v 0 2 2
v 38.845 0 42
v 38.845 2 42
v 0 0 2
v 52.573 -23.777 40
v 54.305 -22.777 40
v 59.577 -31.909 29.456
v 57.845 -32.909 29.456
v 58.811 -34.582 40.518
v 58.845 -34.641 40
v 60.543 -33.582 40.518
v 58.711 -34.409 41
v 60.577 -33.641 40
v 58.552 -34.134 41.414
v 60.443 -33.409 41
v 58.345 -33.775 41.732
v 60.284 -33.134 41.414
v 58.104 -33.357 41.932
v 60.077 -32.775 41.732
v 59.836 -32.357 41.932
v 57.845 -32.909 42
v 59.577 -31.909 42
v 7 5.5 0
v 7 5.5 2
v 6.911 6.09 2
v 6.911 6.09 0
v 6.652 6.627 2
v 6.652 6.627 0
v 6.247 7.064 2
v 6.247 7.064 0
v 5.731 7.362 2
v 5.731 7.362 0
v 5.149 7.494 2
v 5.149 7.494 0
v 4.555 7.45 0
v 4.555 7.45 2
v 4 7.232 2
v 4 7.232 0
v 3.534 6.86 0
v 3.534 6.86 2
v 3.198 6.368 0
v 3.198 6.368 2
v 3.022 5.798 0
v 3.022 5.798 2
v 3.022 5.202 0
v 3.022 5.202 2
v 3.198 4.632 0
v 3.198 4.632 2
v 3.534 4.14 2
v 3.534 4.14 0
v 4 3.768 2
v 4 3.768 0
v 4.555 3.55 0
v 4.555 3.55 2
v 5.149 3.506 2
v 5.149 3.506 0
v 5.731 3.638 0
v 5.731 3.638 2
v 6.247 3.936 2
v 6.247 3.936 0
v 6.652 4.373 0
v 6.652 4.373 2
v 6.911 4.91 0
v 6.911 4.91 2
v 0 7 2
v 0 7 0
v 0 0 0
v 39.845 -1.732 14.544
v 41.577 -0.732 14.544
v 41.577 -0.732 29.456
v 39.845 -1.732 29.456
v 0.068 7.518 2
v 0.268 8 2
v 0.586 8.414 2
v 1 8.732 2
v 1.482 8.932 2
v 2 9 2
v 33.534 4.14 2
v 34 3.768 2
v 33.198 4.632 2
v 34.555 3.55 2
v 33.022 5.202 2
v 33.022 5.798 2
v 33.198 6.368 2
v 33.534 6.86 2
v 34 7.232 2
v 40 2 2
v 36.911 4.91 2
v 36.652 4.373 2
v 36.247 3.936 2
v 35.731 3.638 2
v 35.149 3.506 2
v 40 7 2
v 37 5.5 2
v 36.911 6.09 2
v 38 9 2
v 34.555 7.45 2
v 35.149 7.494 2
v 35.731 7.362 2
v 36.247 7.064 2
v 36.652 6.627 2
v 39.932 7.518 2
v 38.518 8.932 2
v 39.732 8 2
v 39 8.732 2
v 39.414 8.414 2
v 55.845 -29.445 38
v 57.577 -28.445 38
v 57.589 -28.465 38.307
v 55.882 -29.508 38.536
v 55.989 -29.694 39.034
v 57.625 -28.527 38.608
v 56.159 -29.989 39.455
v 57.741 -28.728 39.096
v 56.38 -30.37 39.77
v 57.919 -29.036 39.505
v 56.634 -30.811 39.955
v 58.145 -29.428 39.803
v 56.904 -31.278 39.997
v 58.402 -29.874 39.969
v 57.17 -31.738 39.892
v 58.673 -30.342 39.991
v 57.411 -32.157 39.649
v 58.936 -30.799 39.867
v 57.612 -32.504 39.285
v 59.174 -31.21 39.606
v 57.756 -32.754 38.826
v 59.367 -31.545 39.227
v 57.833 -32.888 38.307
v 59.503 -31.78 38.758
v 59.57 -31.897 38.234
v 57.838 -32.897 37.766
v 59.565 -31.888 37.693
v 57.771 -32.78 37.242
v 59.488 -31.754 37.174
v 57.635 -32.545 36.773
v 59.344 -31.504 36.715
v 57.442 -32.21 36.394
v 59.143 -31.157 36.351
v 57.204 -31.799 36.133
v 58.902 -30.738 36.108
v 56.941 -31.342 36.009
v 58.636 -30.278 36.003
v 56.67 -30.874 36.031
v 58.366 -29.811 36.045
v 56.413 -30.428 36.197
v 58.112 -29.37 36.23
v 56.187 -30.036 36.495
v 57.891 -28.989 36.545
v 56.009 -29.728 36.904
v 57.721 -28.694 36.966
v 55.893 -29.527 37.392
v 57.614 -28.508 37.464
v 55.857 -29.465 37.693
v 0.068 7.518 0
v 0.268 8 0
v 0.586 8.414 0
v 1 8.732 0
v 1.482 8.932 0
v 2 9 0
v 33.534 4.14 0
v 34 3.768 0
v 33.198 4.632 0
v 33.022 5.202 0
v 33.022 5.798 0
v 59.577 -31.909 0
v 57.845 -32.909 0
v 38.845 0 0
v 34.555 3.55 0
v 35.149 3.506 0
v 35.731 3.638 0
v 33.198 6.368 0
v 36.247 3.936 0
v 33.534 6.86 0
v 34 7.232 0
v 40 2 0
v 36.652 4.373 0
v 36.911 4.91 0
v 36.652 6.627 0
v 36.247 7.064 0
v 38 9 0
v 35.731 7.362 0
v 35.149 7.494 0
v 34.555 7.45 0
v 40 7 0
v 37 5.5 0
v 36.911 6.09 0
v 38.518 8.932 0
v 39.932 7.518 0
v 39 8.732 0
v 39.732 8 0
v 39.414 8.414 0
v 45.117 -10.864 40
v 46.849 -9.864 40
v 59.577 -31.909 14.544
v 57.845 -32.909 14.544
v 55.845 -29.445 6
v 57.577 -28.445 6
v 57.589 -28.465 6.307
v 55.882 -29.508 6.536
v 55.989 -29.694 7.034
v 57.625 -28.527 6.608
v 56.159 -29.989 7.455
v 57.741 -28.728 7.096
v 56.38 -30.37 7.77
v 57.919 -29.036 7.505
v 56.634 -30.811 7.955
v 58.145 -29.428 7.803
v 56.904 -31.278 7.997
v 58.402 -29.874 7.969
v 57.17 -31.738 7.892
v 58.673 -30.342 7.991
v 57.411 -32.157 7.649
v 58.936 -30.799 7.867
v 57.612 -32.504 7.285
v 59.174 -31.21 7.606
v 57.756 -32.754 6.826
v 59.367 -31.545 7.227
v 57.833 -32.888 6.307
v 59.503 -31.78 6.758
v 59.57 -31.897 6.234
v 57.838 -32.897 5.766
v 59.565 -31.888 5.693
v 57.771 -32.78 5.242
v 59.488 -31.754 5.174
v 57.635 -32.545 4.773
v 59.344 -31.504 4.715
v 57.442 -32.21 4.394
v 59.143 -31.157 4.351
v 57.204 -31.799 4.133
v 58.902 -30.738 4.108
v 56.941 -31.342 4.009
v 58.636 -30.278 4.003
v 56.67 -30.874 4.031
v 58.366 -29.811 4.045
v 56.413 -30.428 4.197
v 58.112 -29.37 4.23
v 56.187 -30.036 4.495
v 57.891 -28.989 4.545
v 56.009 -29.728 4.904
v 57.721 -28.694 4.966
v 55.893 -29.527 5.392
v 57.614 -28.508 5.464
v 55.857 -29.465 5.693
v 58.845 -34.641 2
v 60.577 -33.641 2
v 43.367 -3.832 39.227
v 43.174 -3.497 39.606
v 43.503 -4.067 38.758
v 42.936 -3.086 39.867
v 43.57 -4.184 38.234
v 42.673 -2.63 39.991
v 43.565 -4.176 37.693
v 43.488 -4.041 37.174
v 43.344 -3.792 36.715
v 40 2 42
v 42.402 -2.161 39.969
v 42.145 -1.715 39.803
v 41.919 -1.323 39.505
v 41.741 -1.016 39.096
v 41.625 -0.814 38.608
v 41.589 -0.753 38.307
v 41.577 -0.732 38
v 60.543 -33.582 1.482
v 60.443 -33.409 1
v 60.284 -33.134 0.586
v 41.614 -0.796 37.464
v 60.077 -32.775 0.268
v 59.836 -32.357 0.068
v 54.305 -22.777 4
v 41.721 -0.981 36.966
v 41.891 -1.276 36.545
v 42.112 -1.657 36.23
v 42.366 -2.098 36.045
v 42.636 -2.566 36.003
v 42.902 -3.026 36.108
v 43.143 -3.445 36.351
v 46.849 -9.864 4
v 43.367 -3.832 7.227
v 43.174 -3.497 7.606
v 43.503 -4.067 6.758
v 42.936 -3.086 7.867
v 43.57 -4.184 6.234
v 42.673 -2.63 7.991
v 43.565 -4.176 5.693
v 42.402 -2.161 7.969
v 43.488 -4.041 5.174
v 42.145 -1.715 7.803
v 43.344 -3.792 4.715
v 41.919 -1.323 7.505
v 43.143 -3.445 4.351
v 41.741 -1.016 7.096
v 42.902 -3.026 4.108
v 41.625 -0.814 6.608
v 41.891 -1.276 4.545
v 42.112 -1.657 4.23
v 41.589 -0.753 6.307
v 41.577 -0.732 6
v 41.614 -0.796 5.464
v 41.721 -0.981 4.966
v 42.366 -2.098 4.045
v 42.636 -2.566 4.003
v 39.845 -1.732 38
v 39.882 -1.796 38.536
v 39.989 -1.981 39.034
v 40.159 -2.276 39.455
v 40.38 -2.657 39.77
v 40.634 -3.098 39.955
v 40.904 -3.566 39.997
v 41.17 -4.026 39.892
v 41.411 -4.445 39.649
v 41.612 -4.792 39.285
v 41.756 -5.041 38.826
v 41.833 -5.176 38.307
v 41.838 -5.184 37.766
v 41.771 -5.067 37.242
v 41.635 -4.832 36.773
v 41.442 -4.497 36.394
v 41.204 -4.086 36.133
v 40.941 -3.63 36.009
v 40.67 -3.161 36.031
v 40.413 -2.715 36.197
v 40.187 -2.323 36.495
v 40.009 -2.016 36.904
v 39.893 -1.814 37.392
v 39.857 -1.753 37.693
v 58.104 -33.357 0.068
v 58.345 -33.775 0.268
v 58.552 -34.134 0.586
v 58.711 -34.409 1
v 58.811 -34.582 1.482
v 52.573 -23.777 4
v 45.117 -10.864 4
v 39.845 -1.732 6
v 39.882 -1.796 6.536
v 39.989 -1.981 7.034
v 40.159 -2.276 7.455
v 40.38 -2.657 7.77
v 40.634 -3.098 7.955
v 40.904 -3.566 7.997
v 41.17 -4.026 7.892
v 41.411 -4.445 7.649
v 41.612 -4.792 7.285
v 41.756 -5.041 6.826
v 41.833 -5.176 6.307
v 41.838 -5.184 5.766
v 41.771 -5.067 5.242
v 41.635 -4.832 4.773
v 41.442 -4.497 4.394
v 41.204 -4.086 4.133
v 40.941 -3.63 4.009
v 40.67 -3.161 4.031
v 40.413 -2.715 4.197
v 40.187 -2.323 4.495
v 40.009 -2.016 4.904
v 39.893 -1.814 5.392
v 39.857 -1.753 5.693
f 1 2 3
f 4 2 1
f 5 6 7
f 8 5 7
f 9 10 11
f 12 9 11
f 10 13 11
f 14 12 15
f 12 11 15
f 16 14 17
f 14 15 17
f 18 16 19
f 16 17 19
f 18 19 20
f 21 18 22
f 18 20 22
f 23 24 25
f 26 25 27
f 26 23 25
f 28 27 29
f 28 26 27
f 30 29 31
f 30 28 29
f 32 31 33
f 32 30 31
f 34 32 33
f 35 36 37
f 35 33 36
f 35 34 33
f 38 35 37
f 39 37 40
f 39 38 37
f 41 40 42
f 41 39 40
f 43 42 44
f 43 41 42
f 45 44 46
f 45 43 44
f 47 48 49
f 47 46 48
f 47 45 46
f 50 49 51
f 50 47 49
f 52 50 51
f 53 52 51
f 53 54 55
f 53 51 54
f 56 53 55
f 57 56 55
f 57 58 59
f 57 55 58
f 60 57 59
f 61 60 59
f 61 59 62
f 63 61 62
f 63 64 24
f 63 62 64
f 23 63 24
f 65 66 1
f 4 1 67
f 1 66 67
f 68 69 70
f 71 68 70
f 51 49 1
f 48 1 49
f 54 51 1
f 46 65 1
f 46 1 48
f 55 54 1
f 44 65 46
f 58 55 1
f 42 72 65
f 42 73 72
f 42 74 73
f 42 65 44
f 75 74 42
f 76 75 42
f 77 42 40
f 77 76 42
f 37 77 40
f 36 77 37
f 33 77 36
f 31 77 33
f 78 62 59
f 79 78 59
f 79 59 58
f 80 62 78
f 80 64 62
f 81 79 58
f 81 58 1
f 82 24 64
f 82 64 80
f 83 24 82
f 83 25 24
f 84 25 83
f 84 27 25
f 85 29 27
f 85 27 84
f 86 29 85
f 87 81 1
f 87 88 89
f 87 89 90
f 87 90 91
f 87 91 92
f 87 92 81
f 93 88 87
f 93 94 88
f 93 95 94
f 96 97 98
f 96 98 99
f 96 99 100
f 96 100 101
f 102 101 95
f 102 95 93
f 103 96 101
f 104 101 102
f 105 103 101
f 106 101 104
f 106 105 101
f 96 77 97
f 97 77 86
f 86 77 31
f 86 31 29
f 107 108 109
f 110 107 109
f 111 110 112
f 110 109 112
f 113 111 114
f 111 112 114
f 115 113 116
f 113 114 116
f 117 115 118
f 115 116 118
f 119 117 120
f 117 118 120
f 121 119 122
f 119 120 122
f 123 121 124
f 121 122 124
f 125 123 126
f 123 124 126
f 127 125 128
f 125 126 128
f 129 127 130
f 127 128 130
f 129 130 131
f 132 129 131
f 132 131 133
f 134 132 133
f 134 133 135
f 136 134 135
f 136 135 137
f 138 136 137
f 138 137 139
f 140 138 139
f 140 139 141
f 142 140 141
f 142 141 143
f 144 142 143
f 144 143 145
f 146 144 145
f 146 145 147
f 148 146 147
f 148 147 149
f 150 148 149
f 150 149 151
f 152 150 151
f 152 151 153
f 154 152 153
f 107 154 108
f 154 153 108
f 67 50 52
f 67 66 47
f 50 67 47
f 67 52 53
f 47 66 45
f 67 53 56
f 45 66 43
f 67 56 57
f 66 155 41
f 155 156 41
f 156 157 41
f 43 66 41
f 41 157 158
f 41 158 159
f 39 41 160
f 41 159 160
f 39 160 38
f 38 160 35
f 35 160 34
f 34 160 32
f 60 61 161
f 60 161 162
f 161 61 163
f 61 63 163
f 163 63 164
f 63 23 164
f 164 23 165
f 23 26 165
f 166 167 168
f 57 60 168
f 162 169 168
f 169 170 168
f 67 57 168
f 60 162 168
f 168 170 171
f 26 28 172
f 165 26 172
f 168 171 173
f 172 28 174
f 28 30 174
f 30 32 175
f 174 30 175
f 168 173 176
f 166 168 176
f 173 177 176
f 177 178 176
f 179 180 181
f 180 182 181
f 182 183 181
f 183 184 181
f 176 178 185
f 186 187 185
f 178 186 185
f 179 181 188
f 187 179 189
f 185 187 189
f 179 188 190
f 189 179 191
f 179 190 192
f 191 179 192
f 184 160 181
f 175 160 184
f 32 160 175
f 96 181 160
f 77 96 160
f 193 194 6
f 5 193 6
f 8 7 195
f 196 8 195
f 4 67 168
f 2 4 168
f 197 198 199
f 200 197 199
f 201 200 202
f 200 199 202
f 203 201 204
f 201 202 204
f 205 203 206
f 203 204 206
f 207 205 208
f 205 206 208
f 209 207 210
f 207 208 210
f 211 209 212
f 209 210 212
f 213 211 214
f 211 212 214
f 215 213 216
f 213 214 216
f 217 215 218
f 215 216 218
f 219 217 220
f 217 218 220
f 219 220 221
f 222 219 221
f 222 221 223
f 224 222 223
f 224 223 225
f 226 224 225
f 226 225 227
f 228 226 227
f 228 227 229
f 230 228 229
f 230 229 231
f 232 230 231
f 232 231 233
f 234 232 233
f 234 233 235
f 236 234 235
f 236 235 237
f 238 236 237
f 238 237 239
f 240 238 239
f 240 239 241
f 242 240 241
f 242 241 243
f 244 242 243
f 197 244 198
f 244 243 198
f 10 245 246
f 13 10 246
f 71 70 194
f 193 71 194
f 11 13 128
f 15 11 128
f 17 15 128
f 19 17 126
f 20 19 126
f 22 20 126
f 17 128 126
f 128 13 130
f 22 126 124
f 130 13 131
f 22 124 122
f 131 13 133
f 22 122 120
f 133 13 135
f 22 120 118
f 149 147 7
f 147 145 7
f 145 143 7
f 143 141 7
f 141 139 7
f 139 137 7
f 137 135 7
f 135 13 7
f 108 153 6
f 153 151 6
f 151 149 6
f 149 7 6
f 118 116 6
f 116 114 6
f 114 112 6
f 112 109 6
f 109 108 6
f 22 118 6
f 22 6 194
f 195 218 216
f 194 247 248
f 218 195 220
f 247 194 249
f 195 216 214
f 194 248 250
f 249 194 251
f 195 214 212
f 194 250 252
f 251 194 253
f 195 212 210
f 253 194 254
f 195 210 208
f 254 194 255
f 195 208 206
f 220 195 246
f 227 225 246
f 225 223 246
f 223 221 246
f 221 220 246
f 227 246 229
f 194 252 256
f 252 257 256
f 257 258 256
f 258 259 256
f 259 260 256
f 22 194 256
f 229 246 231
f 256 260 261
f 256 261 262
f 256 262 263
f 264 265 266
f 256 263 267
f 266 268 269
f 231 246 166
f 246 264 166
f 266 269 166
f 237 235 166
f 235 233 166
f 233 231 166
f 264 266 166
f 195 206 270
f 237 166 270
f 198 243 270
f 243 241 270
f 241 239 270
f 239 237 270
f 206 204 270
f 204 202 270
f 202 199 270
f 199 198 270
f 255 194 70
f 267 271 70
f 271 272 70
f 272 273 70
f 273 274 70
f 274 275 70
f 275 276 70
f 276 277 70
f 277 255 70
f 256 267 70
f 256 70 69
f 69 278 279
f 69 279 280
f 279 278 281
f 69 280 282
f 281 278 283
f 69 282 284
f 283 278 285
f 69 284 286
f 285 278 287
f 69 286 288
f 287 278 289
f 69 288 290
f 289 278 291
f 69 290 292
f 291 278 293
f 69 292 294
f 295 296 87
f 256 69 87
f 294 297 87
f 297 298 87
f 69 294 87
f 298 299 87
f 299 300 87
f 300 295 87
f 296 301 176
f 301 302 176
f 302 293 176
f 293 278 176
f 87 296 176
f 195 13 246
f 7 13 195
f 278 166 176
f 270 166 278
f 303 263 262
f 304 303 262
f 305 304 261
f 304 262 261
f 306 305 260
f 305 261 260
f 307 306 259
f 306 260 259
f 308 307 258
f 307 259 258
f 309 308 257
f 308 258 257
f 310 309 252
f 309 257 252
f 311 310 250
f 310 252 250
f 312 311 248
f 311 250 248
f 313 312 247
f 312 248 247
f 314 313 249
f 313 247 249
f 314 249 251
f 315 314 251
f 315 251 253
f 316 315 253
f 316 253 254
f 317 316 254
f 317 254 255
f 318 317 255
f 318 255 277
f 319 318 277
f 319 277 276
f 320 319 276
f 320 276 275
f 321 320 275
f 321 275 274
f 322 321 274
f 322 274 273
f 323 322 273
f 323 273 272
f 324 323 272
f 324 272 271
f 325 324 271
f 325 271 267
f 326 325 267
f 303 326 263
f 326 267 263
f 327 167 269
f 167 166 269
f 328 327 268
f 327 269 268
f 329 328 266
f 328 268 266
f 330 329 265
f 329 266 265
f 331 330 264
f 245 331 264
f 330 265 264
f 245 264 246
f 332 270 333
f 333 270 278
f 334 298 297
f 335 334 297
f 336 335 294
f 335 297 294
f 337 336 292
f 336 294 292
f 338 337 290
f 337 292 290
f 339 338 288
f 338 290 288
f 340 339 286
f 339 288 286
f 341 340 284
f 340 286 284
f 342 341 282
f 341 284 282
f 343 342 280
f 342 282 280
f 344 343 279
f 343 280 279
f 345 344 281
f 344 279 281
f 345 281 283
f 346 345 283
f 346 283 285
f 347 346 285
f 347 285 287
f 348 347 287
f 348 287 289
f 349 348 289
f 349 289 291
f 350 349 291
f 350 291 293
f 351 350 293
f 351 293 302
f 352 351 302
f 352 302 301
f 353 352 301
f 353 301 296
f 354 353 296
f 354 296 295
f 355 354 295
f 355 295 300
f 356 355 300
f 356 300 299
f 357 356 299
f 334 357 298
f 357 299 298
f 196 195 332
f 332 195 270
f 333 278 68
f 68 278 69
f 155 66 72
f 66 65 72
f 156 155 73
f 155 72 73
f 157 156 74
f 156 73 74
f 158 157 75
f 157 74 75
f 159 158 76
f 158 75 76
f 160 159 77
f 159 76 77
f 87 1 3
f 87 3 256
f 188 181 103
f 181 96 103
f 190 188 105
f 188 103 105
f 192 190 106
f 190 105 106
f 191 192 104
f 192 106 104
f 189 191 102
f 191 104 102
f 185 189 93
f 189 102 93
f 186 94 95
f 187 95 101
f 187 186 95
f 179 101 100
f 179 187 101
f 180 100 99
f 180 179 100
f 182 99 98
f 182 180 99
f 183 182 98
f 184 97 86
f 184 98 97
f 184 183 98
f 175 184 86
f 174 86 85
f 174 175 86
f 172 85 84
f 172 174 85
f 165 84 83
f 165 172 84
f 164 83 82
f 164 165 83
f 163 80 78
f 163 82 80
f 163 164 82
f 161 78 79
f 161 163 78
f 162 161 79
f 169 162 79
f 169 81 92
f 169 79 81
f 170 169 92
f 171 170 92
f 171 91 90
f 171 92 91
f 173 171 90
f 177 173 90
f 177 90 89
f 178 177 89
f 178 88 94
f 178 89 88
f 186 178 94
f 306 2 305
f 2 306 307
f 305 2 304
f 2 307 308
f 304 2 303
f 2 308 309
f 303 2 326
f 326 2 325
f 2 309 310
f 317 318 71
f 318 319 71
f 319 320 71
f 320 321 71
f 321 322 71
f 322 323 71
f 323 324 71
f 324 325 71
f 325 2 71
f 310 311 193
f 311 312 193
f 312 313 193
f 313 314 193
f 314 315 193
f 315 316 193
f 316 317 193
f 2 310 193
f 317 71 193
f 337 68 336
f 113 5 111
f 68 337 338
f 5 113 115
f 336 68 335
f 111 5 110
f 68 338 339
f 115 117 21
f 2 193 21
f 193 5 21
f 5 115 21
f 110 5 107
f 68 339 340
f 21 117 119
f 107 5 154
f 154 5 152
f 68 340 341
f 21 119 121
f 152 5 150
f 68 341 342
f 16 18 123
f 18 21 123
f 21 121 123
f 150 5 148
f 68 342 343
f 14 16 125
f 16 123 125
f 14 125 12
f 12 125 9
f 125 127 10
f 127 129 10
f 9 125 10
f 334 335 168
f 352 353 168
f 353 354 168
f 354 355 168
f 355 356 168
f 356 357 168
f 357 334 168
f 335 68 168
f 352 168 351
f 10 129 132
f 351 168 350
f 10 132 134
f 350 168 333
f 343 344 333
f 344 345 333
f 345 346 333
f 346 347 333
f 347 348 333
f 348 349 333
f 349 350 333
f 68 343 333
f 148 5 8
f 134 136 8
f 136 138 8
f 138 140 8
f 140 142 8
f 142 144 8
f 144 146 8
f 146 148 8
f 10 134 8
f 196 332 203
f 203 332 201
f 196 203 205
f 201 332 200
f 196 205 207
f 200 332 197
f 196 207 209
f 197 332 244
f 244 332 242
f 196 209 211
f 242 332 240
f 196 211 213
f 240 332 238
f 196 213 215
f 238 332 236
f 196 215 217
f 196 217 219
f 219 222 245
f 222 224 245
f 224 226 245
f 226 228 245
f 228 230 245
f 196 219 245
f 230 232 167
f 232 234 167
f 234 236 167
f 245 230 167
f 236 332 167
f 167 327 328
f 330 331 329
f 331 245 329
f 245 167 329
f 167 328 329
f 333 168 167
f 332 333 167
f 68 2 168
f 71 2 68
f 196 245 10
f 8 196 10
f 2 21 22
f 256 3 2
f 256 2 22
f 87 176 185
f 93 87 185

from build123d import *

# Parameters (mm, degrees)
SKETCH_R        = 2
PAD_DEPTH       = 42
SKETCH001_W     = 40
SKETCH001_H     = 7
POCKET_DEPTH    = 40
POCKET001_DEPTH = 5
SKETCH003_R     = 2
POCKET002_DEPTH = 5
FILLET_R        = 2


with BuildPart() as part:
    # Sketch → Pad (new body)
    with BuildSketch(Plane.XY):
        Polygon((0, 0), (38.845299, 0), (58.845299, -34.641016), (60.57735, -33.641016), (40, 2), (40, 9), (0, 9), align=None)
        with Locations((5, 5.5)):
            Circle(SKETCH_R, mode=Mode.SUBTRACT)
        with Locations((35, 5.5)):
            Circle(SKETCH_R, mode=Mode.SUBTRACT)
    extrude(amount=PAD_DEPTH)

    # Sketch001 (on Face11 of Pad) → Pocket (cut)
    with BuildSketch(Plane.XY.offset(42)):
        with Locations((20, 5.5)):
            Rectangle(SKETCH001_W, SKETCH001_H)
    extrude(amount=-POCKET_DEPTH, mode=Mode.SUBTRACT)

    # Sketch002 (on Face6 of Pocket) → Pocket001 (cut)
    with BuildSketch(Plane.XZ):
        Polygon((0, 2), (0, 42), (38.845299, 42), align=None)
    extrude(amount=-POCKET001_DEPTH, mode=Mode.SUBTRACT)

    # Sketch003 (on Face9 of Pocket001) → Pocket002 (cut)
    with BuildSketch(Plane(origin=(30.866025, 17.820508, 0), x_dir=(-0.5, 0.866025, 0), z_dir=(0.866025, 0.5, 0))):
        with Locations((-55.42265, 38)):
            Circle(SKETCH003_R)
        with Locations((-23.42265, 38)):
            Circle(SKETCH003_R)
        with Locations((-23.42265, 6)):
            Circle(SKETCH003_R)
        with Locations((-55.42265, 6)):
            Circle(SKETCH003_R)
        Polygon((-21.42265, 29.455844), (-31.966806, 40), (-46.878494, 40), (-57.42265, 29.455844), (-57.42265, 14.544156), (-46.878494, 4), (-31.966806, 4), (-21.42265, 14.544156), align=None)
    extrude(amount=-POCKET002_DEPTH, mode=Mode.SUBTRACT)

    # Fillet
    fillet_edges = [part.edges().sort_by_distance(p)[0] for p in [
        (59.711325, -34.141016, 42),
        (59.711325, -34.141016, 0),
        (40, 9, 1),
        (0, 9, 1),
    ]]
    fillet(fillet_edges, radius=FILLET_R)


solid = part.part
